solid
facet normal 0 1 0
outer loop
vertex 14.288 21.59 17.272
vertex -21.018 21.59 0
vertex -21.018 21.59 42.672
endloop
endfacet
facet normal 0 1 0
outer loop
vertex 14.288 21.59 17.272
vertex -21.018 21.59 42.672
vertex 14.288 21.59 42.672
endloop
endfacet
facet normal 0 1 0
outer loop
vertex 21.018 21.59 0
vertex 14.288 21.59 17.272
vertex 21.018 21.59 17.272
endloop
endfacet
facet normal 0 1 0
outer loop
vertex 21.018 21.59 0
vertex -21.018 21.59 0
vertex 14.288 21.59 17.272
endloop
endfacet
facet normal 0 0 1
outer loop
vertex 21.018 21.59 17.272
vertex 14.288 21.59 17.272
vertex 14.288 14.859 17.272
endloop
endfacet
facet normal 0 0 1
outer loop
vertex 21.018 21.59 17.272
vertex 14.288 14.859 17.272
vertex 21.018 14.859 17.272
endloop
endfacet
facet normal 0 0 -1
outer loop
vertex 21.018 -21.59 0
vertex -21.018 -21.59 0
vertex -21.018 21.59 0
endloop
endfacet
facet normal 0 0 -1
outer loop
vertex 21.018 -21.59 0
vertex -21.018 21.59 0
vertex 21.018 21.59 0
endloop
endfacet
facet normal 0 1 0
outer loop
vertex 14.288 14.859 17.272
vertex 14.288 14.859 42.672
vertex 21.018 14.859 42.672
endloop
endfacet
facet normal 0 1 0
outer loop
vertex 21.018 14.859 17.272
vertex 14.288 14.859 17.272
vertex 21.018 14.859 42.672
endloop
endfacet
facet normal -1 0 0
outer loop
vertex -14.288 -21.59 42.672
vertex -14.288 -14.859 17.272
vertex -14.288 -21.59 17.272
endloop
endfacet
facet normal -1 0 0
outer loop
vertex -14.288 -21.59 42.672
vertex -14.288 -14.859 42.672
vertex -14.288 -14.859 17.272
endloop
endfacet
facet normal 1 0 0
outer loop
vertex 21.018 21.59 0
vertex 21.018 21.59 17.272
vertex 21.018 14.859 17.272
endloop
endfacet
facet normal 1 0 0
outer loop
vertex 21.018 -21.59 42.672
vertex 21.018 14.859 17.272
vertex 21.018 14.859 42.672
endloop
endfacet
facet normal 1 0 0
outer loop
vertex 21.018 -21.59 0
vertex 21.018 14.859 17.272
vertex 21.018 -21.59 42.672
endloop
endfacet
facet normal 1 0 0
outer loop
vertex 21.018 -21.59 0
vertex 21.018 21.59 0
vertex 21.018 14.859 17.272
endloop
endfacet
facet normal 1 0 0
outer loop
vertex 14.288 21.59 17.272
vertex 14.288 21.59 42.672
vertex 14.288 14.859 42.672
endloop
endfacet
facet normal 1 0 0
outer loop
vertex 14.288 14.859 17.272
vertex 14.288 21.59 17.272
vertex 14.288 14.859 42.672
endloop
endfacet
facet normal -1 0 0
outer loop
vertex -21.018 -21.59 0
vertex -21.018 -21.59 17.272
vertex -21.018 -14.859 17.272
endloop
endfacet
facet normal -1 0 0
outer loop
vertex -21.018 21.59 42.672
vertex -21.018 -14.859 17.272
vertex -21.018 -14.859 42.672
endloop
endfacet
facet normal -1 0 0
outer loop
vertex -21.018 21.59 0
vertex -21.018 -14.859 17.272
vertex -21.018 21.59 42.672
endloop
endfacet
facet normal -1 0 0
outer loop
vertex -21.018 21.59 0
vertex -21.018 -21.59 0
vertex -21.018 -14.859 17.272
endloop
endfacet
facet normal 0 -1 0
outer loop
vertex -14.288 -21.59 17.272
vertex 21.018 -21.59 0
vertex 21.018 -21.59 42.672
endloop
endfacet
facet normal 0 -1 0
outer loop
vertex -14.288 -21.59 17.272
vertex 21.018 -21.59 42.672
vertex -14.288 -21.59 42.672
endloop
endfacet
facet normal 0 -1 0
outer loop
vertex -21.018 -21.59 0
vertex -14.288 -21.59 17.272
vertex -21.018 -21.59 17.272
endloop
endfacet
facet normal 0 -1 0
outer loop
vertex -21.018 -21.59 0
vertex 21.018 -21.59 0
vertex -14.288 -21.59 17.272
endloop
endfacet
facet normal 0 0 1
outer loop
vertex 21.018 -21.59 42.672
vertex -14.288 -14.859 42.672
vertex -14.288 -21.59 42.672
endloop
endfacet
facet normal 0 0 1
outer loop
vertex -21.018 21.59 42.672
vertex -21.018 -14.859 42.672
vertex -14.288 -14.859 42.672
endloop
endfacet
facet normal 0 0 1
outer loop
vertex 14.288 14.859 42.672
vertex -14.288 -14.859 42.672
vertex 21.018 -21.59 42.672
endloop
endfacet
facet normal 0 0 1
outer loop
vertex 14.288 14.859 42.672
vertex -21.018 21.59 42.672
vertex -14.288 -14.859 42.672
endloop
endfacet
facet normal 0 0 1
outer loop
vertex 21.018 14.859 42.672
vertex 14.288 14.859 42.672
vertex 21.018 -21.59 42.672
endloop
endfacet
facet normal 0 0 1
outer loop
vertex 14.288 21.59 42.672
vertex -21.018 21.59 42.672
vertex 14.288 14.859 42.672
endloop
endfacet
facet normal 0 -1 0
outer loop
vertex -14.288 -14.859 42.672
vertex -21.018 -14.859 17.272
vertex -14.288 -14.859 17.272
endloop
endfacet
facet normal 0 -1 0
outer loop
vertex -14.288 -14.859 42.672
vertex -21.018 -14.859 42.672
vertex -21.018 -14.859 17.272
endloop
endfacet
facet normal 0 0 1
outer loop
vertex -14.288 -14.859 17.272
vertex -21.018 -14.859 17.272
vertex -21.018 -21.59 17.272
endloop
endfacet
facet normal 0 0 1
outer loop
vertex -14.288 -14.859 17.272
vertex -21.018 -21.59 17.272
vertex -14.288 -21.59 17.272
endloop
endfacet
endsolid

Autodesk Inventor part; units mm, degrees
ref_plane "YZ Plane" through (0, 0, 0) normal (1, 0, 0) x (0, 1, 0)
ref_plane "XZ Plane" through (0, 0, 0) normal (0, 1, 0) x (-1, 0, 0)
ref_plane "XY Plane" through (0, 0, 0) normal (0, 0, 1) x (1, 0, 0)
sketch "Sketch1" plane through (0, 0, 0) normal (0, 0, 1) x (1, 0, 0)
  line L0 (-21.0185, 21.59) -> (21.0185, 21.59)
  line L1 (21.0185, 21.59) -> (21.0185, -21.59)
  line L2 (21.0185, -21.59) -> (-21.0185, -21.59)
  line L3 (-21.0185, -21.59) -> (-21.0185, 21.59)
  point P0 (0, 0)
  dimension "d0" = 42.037
  dimension "d1" = 43.18
  dimension "d2" = 21.59
  dimension "d3" = 21.0185
extrude "Extrusion1" add sketch "Sketch1" along normal blind 42.672
sketch "Sketch2" plane through (0, 0, 42.672) normal (0, 0, 1) x (1, 0, 0)
  line L0 (21.0185, 21.59) -> (-21.0185, 21.59) projected
  line L1 (14.2875, 21.59) -> (14.2875, 14.859)
  line L2 (14.2875, 14.859) -> (21.0185, 14.859)
  line L3 (-21.0185, 21.59) -> (-21.0185, -21.59) projected
  line L4 (-21.0185, -14.859) -> (-14.2875, -14.859)
  line L5 (-14.2875, -14.859) -> (-14.2875, -21.59)
  line L6 (-21.0185, -21.59) -> (21.0185, -21.59) projected
  line L7 (21.0185, -21.59) -> (21.0185, 21.59) projected
  line L8 (14.2875, 21.59) -> (21.0185, 21.59)
  line L9 (21.0185, 21.59) -> (21.0185, 14.859)
  line L10 (-21.0185, -14.859) -> (-21.0185, -21.59)
  line L11 (-21.0185, -21.59) -> (-14.2875, -21.59)
  point P0 (0, 0)
  dimension "d6" = 6.731
  dimension "d7" = 6.731
  dimension "d8" = 6.731
  dimension "d9" = 6.731
  dimension "d10" = 0
extrude "Extrusion2" cut sketch "Sketch2" against normal blind 25.4 contours L7 L2 L1 L0 | L4 L5 L6 L3
equation "\"d2\" = 0.5 * d1"
equation "\"d3\" = 0.5 * d0"
equation "\"d6\" = d7"
equation "\"d8\" = d7"
equation "\"d9\" = d8"
properties part number "Transmission"
